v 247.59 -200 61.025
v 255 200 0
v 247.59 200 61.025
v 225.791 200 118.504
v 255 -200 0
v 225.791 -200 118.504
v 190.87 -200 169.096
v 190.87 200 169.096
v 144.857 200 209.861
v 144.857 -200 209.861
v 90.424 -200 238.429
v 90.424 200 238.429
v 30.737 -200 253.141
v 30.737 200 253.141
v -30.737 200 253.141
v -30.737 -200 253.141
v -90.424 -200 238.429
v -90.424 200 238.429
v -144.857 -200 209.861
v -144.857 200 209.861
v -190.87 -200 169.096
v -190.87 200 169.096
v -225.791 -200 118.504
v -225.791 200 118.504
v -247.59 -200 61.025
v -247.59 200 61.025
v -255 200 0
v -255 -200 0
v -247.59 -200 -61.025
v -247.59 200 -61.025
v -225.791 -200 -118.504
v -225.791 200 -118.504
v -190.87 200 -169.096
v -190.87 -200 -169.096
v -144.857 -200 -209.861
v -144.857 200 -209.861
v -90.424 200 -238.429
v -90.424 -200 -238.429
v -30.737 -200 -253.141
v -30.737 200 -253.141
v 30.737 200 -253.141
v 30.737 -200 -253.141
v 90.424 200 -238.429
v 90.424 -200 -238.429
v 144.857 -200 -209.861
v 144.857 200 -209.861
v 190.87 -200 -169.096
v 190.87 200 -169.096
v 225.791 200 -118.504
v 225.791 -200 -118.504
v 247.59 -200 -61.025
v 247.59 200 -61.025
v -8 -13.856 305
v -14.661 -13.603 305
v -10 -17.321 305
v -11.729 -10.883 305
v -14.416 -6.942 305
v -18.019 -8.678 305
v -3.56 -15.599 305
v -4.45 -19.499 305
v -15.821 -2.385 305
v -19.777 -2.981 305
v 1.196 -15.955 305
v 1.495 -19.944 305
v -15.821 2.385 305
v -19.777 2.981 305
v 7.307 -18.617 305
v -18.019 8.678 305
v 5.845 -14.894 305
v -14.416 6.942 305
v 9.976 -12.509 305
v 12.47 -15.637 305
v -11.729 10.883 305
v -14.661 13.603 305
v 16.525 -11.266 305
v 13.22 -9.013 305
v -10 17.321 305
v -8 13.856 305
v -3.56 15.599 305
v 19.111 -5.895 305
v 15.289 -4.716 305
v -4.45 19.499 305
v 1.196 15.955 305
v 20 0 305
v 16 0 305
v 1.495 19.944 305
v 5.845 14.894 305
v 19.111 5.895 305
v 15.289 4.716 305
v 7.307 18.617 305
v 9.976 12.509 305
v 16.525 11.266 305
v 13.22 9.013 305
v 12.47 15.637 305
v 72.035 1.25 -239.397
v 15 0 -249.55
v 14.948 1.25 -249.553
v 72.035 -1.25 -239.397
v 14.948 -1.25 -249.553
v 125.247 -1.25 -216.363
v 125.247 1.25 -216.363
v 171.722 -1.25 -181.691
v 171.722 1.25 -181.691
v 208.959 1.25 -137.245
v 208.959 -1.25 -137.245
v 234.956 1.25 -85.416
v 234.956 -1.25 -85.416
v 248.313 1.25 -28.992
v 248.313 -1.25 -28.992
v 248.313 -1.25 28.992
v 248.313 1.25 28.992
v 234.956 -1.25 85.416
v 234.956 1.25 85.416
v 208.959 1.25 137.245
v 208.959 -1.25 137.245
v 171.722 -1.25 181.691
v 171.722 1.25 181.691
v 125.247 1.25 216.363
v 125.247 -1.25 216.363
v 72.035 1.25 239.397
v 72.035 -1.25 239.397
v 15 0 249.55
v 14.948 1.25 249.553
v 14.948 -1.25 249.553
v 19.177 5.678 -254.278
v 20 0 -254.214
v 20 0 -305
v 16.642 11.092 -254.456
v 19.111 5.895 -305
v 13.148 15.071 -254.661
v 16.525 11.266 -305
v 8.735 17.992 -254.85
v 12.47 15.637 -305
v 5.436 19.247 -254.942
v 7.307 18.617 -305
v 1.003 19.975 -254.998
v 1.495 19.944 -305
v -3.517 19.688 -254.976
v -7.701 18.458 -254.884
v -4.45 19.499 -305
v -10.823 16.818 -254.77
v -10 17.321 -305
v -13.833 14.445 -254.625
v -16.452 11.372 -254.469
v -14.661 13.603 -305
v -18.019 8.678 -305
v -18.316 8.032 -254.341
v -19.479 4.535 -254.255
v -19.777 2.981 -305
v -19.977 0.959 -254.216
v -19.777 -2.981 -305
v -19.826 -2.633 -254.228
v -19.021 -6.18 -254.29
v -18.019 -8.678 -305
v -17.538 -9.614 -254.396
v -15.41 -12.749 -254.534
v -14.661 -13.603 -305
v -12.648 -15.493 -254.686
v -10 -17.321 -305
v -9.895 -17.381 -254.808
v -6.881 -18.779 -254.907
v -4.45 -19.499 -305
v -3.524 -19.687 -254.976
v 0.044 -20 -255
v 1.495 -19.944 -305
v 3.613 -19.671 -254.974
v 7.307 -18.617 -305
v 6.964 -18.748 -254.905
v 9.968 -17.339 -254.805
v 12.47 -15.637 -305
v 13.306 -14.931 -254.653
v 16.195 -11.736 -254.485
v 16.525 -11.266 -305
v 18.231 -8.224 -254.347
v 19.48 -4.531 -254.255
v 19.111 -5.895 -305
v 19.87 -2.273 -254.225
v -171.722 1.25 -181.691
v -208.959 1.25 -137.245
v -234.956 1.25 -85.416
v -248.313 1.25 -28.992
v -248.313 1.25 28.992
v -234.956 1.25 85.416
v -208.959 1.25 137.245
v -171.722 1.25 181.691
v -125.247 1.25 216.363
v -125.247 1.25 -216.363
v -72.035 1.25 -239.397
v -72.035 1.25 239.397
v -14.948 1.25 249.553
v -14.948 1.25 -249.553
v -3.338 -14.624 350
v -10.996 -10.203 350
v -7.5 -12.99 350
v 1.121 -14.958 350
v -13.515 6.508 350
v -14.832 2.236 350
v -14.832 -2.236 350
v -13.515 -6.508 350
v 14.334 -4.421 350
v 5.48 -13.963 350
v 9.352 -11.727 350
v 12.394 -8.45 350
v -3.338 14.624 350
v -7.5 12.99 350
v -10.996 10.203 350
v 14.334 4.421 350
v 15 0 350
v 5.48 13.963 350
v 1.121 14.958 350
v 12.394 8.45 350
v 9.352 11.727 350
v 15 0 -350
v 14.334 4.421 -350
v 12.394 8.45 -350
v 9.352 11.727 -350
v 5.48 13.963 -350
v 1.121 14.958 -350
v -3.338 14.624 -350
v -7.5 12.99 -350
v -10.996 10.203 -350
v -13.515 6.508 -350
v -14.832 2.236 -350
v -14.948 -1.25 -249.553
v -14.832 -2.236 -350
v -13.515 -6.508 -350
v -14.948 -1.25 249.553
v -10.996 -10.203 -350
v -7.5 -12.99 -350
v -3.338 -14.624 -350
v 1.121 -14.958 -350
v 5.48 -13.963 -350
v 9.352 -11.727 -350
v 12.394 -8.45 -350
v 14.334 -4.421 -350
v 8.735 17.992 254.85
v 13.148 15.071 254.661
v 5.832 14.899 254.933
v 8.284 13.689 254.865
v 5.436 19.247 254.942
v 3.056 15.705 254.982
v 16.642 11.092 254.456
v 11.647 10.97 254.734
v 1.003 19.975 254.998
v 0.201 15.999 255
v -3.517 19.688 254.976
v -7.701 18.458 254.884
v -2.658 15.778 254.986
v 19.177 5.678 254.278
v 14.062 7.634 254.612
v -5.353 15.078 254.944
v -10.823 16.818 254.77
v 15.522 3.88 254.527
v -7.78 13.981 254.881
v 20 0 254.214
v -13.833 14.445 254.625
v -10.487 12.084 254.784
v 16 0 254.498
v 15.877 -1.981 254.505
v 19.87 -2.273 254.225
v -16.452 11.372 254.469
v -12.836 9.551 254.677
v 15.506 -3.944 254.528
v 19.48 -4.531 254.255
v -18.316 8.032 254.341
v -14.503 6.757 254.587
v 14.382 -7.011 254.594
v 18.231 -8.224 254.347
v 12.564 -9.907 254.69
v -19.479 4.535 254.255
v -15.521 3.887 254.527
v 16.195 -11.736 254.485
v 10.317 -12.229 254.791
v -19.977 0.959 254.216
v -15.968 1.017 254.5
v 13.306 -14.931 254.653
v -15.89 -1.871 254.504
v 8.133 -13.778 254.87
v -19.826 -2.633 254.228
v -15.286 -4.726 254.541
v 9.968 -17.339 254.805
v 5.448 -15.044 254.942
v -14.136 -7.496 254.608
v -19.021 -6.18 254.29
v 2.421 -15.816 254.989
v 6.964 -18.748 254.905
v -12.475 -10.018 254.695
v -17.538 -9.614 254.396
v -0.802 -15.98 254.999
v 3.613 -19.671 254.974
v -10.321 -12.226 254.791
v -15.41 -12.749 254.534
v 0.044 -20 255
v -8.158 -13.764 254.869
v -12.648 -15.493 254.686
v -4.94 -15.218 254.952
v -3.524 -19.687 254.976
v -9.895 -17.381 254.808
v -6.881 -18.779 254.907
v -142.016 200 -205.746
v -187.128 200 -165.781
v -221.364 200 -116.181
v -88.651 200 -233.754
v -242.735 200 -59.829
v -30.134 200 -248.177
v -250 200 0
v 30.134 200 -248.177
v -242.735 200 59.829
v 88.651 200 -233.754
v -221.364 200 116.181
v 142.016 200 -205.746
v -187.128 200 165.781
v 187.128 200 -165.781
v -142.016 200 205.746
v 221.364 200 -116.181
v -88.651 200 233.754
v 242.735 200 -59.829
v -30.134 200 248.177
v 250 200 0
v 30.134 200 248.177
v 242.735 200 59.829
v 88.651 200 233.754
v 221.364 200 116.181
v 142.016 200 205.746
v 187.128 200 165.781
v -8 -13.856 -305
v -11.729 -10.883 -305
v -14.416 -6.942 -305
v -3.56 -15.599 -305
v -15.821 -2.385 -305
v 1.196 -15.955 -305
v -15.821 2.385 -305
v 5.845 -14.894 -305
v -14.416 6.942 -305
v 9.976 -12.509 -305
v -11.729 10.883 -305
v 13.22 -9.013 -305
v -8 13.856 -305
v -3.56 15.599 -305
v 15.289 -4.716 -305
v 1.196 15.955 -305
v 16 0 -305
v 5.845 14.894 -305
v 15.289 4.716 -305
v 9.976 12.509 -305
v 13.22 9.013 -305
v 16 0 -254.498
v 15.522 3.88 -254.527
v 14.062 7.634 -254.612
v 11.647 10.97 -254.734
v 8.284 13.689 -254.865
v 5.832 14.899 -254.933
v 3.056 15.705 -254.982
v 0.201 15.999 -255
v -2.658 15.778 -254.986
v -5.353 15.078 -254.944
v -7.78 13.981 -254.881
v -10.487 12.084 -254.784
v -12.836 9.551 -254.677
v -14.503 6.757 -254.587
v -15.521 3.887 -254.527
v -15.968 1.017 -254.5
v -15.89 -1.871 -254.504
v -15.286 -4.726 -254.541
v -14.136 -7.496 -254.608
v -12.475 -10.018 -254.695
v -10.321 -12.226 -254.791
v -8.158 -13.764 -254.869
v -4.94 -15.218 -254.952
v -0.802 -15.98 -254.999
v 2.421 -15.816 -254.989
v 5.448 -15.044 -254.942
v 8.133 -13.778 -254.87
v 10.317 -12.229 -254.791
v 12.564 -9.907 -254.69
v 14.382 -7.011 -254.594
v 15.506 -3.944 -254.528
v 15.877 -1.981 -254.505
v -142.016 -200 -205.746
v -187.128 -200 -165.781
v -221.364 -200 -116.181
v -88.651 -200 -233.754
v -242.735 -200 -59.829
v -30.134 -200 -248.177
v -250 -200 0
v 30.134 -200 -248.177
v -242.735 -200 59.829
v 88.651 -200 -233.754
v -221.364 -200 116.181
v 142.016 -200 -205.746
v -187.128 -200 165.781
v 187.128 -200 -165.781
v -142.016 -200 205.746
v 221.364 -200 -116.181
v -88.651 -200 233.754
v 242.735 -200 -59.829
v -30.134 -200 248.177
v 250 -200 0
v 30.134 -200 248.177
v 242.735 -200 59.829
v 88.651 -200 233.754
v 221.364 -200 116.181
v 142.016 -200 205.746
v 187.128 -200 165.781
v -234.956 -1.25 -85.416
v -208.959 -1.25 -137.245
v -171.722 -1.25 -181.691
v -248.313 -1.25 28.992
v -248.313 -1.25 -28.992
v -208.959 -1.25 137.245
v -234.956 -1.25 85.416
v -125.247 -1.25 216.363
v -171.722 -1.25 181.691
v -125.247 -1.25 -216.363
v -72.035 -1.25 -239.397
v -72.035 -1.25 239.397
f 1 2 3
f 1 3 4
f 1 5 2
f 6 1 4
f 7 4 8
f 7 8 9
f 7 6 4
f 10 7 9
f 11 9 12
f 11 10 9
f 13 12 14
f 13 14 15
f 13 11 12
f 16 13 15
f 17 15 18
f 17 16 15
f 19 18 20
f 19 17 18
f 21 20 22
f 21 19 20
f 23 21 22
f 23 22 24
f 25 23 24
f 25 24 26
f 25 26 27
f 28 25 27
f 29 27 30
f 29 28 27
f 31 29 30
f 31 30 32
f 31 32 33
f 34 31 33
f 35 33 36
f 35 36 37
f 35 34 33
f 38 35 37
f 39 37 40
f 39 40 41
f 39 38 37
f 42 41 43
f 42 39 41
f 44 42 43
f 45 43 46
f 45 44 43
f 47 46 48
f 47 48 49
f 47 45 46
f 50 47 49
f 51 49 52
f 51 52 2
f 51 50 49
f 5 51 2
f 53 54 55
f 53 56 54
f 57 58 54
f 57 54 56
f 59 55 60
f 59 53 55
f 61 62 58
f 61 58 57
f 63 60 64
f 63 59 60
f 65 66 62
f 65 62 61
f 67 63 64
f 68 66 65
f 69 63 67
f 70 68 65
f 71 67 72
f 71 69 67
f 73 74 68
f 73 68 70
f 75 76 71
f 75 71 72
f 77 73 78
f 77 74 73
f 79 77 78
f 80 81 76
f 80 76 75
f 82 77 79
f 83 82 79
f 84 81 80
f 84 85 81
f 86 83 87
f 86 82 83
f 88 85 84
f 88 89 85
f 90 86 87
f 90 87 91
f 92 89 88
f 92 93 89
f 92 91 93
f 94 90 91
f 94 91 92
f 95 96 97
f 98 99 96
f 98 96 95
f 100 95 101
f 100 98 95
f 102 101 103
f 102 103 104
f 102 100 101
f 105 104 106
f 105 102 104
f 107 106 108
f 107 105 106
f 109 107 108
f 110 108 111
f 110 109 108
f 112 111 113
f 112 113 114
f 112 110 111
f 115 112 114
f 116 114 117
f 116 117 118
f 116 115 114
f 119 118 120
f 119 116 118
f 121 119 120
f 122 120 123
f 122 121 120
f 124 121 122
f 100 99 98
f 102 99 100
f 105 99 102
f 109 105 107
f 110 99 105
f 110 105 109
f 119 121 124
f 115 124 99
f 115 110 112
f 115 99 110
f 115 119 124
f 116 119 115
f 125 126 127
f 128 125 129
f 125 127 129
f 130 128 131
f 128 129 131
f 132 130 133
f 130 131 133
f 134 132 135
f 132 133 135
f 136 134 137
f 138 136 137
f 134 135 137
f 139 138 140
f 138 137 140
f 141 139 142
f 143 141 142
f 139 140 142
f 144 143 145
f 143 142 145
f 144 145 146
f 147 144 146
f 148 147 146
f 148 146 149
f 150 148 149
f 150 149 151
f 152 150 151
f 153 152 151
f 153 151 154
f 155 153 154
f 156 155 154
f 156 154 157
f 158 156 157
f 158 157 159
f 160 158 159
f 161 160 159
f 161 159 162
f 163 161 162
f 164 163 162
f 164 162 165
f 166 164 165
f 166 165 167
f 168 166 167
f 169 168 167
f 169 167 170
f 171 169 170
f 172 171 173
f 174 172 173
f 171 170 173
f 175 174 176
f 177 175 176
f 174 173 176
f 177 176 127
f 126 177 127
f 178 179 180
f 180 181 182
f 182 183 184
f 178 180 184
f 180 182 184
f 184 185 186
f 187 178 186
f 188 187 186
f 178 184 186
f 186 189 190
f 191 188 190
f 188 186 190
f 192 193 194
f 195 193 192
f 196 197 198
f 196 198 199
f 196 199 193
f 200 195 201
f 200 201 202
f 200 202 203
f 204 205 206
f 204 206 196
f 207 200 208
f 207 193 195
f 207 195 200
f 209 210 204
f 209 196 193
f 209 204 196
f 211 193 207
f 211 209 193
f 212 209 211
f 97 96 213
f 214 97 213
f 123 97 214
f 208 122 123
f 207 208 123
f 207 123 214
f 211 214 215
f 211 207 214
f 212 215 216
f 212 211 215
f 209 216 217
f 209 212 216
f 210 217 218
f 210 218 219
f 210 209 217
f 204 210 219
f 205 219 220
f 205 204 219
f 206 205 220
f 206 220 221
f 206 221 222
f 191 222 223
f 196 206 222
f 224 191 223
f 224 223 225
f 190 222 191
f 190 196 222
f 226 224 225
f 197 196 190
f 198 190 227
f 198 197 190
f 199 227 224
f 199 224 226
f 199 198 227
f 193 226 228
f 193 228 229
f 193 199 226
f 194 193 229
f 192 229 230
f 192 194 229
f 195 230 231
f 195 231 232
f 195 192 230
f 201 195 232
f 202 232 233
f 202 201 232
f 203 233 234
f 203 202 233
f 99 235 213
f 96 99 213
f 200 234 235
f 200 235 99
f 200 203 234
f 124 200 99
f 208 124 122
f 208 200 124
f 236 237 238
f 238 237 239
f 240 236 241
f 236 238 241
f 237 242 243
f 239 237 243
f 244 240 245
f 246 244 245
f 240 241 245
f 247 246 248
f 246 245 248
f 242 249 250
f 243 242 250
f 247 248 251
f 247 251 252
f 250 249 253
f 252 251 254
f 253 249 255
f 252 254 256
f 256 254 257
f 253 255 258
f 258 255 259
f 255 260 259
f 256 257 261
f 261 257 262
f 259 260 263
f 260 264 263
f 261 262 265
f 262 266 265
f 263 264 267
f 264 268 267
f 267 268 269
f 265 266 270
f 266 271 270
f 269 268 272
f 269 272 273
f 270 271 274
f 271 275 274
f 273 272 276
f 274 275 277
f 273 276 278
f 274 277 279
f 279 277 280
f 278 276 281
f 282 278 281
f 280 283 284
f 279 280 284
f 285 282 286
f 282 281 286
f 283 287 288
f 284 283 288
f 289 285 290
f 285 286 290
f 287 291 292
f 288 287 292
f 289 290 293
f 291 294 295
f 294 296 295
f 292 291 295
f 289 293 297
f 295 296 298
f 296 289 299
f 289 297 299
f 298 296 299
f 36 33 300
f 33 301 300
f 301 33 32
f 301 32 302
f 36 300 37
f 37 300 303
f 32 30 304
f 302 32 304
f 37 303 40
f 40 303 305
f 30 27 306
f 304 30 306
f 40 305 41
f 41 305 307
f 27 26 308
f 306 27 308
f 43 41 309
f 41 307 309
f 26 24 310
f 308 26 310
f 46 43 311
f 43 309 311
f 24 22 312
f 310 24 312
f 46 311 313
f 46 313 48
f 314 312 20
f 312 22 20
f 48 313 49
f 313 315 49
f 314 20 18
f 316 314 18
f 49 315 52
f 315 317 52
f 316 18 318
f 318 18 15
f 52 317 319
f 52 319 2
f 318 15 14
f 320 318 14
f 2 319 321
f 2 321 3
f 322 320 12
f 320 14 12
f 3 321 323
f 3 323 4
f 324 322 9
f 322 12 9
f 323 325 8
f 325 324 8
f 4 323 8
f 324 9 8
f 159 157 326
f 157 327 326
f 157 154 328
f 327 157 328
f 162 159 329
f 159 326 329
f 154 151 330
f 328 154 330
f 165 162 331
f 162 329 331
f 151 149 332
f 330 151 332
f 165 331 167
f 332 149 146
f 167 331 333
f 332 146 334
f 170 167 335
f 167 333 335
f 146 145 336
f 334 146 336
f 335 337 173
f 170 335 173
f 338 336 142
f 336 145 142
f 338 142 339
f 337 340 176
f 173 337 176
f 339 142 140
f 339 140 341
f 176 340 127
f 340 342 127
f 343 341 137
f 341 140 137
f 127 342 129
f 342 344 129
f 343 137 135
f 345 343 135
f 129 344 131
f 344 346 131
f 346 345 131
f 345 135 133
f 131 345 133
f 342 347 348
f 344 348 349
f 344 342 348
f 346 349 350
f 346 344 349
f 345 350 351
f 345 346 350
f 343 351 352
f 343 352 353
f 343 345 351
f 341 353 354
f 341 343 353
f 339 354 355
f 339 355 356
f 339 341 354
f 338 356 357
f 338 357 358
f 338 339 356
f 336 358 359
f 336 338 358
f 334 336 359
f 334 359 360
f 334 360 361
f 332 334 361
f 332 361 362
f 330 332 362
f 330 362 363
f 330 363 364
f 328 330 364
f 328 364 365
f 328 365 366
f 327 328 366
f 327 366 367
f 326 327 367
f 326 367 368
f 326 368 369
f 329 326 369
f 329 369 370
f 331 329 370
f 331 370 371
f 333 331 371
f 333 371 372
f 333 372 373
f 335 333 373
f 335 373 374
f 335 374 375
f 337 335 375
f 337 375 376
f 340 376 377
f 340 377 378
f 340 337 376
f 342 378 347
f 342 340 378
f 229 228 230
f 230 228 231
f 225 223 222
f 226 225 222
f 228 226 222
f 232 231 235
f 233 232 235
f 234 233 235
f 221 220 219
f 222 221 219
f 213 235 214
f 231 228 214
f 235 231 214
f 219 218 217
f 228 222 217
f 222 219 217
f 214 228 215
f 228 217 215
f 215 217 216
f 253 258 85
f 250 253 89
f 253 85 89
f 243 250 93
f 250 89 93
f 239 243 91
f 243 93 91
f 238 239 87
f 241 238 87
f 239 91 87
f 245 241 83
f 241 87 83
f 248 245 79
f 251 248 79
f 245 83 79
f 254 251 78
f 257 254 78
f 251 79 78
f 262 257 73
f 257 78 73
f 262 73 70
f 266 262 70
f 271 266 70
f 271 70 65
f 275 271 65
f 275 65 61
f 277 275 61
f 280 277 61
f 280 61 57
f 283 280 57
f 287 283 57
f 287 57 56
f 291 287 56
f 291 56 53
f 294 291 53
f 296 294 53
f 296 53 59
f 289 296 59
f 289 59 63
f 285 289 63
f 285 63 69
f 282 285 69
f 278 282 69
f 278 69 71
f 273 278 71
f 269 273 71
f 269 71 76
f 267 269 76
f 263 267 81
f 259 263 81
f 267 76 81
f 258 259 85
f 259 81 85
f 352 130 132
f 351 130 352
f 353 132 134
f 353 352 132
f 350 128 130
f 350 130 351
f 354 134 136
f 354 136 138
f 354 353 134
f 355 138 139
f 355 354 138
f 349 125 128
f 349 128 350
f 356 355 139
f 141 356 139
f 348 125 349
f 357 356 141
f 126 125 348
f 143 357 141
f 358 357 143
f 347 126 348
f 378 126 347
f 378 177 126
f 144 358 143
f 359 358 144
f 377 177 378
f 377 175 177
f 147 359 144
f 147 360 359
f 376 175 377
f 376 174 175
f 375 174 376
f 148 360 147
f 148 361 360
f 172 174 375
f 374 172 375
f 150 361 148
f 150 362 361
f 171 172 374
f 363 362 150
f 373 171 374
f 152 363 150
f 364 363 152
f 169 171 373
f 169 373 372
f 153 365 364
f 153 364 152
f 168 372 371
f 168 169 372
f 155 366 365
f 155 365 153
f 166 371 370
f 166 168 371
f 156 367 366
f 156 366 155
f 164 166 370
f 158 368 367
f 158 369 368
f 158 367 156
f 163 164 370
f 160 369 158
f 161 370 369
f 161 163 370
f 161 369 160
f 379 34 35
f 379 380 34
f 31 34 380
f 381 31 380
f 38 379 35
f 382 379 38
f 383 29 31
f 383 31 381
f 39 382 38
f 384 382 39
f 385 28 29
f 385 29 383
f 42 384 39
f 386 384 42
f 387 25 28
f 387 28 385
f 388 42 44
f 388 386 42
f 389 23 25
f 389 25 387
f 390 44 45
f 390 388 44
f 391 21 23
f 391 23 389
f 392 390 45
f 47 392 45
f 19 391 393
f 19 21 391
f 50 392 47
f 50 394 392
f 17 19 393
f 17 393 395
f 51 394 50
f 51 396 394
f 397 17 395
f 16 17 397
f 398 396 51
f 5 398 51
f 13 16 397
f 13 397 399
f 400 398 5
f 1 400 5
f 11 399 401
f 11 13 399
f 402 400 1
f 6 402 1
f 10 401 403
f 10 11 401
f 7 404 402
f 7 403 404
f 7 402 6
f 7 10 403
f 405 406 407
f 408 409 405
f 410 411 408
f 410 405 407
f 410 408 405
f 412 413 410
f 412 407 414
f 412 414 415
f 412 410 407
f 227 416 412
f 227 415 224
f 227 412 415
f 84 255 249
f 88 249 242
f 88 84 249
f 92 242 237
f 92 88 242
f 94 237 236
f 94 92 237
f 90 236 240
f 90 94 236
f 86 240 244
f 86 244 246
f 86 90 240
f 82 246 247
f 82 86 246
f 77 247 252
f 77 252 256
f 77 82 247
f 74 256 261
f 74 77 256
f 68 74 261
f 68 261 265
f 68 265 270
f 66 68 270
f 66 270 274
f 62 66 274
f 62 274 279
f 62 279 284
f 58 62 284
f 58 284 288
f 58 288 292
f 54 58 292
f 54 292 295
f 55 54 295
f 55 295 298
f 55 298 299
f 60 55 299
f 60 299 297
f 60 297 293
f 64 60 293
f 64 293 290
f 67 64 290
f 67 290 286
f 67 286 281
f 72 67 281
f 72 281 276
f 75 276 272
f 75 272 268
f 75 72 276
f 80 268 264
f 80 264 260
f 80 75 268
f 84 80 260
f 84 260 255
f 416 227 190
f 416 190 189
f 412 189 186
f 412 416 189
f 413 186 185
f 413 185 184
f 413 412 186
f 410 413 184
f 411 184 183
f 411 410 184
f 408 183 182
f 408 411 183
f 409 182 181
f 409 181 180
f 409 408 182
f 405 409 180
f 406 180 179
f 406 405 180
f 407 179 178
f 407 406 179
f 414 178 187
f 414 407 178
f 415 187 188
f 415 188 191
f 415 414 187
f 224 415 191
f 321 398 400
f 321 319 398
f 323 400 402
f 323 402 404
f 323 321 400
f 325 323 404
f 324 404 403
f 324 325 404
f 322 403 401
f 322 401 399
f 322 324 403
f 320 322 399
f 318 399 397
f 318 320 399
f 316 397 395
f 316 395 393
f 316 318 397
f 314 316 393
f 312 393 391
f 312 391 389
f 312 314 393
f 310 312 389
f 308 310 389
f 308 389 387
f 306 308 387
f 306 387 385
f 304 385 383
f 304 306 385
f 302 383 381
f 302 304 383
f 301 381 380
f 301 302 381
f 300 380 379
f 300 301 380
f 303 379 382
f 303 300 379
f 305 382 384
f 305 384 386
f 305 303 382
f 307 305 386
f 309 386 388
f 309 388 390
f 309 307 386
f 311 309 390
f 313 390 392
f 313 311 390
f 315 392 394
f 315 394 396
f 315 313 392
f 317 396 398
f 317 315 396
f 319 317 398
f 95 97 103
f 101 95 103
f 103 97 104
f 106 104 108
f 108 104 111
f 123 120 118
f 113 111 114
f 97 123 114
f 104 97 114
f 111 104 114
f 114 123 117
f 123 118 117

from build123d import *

# Parameters (mm, degrees)
F0_R     = 250
F1_DEPTH = 1.25
F2_R     = 15
F3_DEPTH = 350
F4_R     = 255
F4_R_2   = 250
F5_DEPTH = 200
F7_R     = 20
F7_R_2   = 16


with BuildPart() as f1:
    # F0 (on Front) → F1 (new body, symmetric)
    with BuildSketch(Plane.XZ):
        Circle(F0_R)
    extrude(amount=F1_DEPTH, both=True)

    # F2 (on Top) → F3 (join, symmetric)
    with BuildSketch(Plane.XY):
        Circle(F2_R)
    extrude(amount=F3_DEPTH, both=True)


with BuildPart() as f5:
    # F4 (on Front) → F5 (new body, symmetric)
    with BuildSketch(Plane.XZ):
        Circle(F4_R)
        Circle(F4_R_2, mode=Mode.SUBTRACT)
    extrude(amount=F5_DEPTH, both=True)


with BuildPart() as f8:
    # F7 (on offset) → F8 (new body, up to the next surface of F5)
    with BuildSketch(Plane.XY.offset(305)):
        Circle(F7_R)
        Circle(F7_R_2, mode=Mode.SUBTRACT)
    extrude(until=Until.NEXT, target=f5.part, dir=(0, 0, -1))


with BuildPart() as f9_1:
    # F9: instance of F8
    add(f8.part.mirror(Plane.XY))


solid = Compound([f1.part, f5.part, f8.part, f9_1.part])
